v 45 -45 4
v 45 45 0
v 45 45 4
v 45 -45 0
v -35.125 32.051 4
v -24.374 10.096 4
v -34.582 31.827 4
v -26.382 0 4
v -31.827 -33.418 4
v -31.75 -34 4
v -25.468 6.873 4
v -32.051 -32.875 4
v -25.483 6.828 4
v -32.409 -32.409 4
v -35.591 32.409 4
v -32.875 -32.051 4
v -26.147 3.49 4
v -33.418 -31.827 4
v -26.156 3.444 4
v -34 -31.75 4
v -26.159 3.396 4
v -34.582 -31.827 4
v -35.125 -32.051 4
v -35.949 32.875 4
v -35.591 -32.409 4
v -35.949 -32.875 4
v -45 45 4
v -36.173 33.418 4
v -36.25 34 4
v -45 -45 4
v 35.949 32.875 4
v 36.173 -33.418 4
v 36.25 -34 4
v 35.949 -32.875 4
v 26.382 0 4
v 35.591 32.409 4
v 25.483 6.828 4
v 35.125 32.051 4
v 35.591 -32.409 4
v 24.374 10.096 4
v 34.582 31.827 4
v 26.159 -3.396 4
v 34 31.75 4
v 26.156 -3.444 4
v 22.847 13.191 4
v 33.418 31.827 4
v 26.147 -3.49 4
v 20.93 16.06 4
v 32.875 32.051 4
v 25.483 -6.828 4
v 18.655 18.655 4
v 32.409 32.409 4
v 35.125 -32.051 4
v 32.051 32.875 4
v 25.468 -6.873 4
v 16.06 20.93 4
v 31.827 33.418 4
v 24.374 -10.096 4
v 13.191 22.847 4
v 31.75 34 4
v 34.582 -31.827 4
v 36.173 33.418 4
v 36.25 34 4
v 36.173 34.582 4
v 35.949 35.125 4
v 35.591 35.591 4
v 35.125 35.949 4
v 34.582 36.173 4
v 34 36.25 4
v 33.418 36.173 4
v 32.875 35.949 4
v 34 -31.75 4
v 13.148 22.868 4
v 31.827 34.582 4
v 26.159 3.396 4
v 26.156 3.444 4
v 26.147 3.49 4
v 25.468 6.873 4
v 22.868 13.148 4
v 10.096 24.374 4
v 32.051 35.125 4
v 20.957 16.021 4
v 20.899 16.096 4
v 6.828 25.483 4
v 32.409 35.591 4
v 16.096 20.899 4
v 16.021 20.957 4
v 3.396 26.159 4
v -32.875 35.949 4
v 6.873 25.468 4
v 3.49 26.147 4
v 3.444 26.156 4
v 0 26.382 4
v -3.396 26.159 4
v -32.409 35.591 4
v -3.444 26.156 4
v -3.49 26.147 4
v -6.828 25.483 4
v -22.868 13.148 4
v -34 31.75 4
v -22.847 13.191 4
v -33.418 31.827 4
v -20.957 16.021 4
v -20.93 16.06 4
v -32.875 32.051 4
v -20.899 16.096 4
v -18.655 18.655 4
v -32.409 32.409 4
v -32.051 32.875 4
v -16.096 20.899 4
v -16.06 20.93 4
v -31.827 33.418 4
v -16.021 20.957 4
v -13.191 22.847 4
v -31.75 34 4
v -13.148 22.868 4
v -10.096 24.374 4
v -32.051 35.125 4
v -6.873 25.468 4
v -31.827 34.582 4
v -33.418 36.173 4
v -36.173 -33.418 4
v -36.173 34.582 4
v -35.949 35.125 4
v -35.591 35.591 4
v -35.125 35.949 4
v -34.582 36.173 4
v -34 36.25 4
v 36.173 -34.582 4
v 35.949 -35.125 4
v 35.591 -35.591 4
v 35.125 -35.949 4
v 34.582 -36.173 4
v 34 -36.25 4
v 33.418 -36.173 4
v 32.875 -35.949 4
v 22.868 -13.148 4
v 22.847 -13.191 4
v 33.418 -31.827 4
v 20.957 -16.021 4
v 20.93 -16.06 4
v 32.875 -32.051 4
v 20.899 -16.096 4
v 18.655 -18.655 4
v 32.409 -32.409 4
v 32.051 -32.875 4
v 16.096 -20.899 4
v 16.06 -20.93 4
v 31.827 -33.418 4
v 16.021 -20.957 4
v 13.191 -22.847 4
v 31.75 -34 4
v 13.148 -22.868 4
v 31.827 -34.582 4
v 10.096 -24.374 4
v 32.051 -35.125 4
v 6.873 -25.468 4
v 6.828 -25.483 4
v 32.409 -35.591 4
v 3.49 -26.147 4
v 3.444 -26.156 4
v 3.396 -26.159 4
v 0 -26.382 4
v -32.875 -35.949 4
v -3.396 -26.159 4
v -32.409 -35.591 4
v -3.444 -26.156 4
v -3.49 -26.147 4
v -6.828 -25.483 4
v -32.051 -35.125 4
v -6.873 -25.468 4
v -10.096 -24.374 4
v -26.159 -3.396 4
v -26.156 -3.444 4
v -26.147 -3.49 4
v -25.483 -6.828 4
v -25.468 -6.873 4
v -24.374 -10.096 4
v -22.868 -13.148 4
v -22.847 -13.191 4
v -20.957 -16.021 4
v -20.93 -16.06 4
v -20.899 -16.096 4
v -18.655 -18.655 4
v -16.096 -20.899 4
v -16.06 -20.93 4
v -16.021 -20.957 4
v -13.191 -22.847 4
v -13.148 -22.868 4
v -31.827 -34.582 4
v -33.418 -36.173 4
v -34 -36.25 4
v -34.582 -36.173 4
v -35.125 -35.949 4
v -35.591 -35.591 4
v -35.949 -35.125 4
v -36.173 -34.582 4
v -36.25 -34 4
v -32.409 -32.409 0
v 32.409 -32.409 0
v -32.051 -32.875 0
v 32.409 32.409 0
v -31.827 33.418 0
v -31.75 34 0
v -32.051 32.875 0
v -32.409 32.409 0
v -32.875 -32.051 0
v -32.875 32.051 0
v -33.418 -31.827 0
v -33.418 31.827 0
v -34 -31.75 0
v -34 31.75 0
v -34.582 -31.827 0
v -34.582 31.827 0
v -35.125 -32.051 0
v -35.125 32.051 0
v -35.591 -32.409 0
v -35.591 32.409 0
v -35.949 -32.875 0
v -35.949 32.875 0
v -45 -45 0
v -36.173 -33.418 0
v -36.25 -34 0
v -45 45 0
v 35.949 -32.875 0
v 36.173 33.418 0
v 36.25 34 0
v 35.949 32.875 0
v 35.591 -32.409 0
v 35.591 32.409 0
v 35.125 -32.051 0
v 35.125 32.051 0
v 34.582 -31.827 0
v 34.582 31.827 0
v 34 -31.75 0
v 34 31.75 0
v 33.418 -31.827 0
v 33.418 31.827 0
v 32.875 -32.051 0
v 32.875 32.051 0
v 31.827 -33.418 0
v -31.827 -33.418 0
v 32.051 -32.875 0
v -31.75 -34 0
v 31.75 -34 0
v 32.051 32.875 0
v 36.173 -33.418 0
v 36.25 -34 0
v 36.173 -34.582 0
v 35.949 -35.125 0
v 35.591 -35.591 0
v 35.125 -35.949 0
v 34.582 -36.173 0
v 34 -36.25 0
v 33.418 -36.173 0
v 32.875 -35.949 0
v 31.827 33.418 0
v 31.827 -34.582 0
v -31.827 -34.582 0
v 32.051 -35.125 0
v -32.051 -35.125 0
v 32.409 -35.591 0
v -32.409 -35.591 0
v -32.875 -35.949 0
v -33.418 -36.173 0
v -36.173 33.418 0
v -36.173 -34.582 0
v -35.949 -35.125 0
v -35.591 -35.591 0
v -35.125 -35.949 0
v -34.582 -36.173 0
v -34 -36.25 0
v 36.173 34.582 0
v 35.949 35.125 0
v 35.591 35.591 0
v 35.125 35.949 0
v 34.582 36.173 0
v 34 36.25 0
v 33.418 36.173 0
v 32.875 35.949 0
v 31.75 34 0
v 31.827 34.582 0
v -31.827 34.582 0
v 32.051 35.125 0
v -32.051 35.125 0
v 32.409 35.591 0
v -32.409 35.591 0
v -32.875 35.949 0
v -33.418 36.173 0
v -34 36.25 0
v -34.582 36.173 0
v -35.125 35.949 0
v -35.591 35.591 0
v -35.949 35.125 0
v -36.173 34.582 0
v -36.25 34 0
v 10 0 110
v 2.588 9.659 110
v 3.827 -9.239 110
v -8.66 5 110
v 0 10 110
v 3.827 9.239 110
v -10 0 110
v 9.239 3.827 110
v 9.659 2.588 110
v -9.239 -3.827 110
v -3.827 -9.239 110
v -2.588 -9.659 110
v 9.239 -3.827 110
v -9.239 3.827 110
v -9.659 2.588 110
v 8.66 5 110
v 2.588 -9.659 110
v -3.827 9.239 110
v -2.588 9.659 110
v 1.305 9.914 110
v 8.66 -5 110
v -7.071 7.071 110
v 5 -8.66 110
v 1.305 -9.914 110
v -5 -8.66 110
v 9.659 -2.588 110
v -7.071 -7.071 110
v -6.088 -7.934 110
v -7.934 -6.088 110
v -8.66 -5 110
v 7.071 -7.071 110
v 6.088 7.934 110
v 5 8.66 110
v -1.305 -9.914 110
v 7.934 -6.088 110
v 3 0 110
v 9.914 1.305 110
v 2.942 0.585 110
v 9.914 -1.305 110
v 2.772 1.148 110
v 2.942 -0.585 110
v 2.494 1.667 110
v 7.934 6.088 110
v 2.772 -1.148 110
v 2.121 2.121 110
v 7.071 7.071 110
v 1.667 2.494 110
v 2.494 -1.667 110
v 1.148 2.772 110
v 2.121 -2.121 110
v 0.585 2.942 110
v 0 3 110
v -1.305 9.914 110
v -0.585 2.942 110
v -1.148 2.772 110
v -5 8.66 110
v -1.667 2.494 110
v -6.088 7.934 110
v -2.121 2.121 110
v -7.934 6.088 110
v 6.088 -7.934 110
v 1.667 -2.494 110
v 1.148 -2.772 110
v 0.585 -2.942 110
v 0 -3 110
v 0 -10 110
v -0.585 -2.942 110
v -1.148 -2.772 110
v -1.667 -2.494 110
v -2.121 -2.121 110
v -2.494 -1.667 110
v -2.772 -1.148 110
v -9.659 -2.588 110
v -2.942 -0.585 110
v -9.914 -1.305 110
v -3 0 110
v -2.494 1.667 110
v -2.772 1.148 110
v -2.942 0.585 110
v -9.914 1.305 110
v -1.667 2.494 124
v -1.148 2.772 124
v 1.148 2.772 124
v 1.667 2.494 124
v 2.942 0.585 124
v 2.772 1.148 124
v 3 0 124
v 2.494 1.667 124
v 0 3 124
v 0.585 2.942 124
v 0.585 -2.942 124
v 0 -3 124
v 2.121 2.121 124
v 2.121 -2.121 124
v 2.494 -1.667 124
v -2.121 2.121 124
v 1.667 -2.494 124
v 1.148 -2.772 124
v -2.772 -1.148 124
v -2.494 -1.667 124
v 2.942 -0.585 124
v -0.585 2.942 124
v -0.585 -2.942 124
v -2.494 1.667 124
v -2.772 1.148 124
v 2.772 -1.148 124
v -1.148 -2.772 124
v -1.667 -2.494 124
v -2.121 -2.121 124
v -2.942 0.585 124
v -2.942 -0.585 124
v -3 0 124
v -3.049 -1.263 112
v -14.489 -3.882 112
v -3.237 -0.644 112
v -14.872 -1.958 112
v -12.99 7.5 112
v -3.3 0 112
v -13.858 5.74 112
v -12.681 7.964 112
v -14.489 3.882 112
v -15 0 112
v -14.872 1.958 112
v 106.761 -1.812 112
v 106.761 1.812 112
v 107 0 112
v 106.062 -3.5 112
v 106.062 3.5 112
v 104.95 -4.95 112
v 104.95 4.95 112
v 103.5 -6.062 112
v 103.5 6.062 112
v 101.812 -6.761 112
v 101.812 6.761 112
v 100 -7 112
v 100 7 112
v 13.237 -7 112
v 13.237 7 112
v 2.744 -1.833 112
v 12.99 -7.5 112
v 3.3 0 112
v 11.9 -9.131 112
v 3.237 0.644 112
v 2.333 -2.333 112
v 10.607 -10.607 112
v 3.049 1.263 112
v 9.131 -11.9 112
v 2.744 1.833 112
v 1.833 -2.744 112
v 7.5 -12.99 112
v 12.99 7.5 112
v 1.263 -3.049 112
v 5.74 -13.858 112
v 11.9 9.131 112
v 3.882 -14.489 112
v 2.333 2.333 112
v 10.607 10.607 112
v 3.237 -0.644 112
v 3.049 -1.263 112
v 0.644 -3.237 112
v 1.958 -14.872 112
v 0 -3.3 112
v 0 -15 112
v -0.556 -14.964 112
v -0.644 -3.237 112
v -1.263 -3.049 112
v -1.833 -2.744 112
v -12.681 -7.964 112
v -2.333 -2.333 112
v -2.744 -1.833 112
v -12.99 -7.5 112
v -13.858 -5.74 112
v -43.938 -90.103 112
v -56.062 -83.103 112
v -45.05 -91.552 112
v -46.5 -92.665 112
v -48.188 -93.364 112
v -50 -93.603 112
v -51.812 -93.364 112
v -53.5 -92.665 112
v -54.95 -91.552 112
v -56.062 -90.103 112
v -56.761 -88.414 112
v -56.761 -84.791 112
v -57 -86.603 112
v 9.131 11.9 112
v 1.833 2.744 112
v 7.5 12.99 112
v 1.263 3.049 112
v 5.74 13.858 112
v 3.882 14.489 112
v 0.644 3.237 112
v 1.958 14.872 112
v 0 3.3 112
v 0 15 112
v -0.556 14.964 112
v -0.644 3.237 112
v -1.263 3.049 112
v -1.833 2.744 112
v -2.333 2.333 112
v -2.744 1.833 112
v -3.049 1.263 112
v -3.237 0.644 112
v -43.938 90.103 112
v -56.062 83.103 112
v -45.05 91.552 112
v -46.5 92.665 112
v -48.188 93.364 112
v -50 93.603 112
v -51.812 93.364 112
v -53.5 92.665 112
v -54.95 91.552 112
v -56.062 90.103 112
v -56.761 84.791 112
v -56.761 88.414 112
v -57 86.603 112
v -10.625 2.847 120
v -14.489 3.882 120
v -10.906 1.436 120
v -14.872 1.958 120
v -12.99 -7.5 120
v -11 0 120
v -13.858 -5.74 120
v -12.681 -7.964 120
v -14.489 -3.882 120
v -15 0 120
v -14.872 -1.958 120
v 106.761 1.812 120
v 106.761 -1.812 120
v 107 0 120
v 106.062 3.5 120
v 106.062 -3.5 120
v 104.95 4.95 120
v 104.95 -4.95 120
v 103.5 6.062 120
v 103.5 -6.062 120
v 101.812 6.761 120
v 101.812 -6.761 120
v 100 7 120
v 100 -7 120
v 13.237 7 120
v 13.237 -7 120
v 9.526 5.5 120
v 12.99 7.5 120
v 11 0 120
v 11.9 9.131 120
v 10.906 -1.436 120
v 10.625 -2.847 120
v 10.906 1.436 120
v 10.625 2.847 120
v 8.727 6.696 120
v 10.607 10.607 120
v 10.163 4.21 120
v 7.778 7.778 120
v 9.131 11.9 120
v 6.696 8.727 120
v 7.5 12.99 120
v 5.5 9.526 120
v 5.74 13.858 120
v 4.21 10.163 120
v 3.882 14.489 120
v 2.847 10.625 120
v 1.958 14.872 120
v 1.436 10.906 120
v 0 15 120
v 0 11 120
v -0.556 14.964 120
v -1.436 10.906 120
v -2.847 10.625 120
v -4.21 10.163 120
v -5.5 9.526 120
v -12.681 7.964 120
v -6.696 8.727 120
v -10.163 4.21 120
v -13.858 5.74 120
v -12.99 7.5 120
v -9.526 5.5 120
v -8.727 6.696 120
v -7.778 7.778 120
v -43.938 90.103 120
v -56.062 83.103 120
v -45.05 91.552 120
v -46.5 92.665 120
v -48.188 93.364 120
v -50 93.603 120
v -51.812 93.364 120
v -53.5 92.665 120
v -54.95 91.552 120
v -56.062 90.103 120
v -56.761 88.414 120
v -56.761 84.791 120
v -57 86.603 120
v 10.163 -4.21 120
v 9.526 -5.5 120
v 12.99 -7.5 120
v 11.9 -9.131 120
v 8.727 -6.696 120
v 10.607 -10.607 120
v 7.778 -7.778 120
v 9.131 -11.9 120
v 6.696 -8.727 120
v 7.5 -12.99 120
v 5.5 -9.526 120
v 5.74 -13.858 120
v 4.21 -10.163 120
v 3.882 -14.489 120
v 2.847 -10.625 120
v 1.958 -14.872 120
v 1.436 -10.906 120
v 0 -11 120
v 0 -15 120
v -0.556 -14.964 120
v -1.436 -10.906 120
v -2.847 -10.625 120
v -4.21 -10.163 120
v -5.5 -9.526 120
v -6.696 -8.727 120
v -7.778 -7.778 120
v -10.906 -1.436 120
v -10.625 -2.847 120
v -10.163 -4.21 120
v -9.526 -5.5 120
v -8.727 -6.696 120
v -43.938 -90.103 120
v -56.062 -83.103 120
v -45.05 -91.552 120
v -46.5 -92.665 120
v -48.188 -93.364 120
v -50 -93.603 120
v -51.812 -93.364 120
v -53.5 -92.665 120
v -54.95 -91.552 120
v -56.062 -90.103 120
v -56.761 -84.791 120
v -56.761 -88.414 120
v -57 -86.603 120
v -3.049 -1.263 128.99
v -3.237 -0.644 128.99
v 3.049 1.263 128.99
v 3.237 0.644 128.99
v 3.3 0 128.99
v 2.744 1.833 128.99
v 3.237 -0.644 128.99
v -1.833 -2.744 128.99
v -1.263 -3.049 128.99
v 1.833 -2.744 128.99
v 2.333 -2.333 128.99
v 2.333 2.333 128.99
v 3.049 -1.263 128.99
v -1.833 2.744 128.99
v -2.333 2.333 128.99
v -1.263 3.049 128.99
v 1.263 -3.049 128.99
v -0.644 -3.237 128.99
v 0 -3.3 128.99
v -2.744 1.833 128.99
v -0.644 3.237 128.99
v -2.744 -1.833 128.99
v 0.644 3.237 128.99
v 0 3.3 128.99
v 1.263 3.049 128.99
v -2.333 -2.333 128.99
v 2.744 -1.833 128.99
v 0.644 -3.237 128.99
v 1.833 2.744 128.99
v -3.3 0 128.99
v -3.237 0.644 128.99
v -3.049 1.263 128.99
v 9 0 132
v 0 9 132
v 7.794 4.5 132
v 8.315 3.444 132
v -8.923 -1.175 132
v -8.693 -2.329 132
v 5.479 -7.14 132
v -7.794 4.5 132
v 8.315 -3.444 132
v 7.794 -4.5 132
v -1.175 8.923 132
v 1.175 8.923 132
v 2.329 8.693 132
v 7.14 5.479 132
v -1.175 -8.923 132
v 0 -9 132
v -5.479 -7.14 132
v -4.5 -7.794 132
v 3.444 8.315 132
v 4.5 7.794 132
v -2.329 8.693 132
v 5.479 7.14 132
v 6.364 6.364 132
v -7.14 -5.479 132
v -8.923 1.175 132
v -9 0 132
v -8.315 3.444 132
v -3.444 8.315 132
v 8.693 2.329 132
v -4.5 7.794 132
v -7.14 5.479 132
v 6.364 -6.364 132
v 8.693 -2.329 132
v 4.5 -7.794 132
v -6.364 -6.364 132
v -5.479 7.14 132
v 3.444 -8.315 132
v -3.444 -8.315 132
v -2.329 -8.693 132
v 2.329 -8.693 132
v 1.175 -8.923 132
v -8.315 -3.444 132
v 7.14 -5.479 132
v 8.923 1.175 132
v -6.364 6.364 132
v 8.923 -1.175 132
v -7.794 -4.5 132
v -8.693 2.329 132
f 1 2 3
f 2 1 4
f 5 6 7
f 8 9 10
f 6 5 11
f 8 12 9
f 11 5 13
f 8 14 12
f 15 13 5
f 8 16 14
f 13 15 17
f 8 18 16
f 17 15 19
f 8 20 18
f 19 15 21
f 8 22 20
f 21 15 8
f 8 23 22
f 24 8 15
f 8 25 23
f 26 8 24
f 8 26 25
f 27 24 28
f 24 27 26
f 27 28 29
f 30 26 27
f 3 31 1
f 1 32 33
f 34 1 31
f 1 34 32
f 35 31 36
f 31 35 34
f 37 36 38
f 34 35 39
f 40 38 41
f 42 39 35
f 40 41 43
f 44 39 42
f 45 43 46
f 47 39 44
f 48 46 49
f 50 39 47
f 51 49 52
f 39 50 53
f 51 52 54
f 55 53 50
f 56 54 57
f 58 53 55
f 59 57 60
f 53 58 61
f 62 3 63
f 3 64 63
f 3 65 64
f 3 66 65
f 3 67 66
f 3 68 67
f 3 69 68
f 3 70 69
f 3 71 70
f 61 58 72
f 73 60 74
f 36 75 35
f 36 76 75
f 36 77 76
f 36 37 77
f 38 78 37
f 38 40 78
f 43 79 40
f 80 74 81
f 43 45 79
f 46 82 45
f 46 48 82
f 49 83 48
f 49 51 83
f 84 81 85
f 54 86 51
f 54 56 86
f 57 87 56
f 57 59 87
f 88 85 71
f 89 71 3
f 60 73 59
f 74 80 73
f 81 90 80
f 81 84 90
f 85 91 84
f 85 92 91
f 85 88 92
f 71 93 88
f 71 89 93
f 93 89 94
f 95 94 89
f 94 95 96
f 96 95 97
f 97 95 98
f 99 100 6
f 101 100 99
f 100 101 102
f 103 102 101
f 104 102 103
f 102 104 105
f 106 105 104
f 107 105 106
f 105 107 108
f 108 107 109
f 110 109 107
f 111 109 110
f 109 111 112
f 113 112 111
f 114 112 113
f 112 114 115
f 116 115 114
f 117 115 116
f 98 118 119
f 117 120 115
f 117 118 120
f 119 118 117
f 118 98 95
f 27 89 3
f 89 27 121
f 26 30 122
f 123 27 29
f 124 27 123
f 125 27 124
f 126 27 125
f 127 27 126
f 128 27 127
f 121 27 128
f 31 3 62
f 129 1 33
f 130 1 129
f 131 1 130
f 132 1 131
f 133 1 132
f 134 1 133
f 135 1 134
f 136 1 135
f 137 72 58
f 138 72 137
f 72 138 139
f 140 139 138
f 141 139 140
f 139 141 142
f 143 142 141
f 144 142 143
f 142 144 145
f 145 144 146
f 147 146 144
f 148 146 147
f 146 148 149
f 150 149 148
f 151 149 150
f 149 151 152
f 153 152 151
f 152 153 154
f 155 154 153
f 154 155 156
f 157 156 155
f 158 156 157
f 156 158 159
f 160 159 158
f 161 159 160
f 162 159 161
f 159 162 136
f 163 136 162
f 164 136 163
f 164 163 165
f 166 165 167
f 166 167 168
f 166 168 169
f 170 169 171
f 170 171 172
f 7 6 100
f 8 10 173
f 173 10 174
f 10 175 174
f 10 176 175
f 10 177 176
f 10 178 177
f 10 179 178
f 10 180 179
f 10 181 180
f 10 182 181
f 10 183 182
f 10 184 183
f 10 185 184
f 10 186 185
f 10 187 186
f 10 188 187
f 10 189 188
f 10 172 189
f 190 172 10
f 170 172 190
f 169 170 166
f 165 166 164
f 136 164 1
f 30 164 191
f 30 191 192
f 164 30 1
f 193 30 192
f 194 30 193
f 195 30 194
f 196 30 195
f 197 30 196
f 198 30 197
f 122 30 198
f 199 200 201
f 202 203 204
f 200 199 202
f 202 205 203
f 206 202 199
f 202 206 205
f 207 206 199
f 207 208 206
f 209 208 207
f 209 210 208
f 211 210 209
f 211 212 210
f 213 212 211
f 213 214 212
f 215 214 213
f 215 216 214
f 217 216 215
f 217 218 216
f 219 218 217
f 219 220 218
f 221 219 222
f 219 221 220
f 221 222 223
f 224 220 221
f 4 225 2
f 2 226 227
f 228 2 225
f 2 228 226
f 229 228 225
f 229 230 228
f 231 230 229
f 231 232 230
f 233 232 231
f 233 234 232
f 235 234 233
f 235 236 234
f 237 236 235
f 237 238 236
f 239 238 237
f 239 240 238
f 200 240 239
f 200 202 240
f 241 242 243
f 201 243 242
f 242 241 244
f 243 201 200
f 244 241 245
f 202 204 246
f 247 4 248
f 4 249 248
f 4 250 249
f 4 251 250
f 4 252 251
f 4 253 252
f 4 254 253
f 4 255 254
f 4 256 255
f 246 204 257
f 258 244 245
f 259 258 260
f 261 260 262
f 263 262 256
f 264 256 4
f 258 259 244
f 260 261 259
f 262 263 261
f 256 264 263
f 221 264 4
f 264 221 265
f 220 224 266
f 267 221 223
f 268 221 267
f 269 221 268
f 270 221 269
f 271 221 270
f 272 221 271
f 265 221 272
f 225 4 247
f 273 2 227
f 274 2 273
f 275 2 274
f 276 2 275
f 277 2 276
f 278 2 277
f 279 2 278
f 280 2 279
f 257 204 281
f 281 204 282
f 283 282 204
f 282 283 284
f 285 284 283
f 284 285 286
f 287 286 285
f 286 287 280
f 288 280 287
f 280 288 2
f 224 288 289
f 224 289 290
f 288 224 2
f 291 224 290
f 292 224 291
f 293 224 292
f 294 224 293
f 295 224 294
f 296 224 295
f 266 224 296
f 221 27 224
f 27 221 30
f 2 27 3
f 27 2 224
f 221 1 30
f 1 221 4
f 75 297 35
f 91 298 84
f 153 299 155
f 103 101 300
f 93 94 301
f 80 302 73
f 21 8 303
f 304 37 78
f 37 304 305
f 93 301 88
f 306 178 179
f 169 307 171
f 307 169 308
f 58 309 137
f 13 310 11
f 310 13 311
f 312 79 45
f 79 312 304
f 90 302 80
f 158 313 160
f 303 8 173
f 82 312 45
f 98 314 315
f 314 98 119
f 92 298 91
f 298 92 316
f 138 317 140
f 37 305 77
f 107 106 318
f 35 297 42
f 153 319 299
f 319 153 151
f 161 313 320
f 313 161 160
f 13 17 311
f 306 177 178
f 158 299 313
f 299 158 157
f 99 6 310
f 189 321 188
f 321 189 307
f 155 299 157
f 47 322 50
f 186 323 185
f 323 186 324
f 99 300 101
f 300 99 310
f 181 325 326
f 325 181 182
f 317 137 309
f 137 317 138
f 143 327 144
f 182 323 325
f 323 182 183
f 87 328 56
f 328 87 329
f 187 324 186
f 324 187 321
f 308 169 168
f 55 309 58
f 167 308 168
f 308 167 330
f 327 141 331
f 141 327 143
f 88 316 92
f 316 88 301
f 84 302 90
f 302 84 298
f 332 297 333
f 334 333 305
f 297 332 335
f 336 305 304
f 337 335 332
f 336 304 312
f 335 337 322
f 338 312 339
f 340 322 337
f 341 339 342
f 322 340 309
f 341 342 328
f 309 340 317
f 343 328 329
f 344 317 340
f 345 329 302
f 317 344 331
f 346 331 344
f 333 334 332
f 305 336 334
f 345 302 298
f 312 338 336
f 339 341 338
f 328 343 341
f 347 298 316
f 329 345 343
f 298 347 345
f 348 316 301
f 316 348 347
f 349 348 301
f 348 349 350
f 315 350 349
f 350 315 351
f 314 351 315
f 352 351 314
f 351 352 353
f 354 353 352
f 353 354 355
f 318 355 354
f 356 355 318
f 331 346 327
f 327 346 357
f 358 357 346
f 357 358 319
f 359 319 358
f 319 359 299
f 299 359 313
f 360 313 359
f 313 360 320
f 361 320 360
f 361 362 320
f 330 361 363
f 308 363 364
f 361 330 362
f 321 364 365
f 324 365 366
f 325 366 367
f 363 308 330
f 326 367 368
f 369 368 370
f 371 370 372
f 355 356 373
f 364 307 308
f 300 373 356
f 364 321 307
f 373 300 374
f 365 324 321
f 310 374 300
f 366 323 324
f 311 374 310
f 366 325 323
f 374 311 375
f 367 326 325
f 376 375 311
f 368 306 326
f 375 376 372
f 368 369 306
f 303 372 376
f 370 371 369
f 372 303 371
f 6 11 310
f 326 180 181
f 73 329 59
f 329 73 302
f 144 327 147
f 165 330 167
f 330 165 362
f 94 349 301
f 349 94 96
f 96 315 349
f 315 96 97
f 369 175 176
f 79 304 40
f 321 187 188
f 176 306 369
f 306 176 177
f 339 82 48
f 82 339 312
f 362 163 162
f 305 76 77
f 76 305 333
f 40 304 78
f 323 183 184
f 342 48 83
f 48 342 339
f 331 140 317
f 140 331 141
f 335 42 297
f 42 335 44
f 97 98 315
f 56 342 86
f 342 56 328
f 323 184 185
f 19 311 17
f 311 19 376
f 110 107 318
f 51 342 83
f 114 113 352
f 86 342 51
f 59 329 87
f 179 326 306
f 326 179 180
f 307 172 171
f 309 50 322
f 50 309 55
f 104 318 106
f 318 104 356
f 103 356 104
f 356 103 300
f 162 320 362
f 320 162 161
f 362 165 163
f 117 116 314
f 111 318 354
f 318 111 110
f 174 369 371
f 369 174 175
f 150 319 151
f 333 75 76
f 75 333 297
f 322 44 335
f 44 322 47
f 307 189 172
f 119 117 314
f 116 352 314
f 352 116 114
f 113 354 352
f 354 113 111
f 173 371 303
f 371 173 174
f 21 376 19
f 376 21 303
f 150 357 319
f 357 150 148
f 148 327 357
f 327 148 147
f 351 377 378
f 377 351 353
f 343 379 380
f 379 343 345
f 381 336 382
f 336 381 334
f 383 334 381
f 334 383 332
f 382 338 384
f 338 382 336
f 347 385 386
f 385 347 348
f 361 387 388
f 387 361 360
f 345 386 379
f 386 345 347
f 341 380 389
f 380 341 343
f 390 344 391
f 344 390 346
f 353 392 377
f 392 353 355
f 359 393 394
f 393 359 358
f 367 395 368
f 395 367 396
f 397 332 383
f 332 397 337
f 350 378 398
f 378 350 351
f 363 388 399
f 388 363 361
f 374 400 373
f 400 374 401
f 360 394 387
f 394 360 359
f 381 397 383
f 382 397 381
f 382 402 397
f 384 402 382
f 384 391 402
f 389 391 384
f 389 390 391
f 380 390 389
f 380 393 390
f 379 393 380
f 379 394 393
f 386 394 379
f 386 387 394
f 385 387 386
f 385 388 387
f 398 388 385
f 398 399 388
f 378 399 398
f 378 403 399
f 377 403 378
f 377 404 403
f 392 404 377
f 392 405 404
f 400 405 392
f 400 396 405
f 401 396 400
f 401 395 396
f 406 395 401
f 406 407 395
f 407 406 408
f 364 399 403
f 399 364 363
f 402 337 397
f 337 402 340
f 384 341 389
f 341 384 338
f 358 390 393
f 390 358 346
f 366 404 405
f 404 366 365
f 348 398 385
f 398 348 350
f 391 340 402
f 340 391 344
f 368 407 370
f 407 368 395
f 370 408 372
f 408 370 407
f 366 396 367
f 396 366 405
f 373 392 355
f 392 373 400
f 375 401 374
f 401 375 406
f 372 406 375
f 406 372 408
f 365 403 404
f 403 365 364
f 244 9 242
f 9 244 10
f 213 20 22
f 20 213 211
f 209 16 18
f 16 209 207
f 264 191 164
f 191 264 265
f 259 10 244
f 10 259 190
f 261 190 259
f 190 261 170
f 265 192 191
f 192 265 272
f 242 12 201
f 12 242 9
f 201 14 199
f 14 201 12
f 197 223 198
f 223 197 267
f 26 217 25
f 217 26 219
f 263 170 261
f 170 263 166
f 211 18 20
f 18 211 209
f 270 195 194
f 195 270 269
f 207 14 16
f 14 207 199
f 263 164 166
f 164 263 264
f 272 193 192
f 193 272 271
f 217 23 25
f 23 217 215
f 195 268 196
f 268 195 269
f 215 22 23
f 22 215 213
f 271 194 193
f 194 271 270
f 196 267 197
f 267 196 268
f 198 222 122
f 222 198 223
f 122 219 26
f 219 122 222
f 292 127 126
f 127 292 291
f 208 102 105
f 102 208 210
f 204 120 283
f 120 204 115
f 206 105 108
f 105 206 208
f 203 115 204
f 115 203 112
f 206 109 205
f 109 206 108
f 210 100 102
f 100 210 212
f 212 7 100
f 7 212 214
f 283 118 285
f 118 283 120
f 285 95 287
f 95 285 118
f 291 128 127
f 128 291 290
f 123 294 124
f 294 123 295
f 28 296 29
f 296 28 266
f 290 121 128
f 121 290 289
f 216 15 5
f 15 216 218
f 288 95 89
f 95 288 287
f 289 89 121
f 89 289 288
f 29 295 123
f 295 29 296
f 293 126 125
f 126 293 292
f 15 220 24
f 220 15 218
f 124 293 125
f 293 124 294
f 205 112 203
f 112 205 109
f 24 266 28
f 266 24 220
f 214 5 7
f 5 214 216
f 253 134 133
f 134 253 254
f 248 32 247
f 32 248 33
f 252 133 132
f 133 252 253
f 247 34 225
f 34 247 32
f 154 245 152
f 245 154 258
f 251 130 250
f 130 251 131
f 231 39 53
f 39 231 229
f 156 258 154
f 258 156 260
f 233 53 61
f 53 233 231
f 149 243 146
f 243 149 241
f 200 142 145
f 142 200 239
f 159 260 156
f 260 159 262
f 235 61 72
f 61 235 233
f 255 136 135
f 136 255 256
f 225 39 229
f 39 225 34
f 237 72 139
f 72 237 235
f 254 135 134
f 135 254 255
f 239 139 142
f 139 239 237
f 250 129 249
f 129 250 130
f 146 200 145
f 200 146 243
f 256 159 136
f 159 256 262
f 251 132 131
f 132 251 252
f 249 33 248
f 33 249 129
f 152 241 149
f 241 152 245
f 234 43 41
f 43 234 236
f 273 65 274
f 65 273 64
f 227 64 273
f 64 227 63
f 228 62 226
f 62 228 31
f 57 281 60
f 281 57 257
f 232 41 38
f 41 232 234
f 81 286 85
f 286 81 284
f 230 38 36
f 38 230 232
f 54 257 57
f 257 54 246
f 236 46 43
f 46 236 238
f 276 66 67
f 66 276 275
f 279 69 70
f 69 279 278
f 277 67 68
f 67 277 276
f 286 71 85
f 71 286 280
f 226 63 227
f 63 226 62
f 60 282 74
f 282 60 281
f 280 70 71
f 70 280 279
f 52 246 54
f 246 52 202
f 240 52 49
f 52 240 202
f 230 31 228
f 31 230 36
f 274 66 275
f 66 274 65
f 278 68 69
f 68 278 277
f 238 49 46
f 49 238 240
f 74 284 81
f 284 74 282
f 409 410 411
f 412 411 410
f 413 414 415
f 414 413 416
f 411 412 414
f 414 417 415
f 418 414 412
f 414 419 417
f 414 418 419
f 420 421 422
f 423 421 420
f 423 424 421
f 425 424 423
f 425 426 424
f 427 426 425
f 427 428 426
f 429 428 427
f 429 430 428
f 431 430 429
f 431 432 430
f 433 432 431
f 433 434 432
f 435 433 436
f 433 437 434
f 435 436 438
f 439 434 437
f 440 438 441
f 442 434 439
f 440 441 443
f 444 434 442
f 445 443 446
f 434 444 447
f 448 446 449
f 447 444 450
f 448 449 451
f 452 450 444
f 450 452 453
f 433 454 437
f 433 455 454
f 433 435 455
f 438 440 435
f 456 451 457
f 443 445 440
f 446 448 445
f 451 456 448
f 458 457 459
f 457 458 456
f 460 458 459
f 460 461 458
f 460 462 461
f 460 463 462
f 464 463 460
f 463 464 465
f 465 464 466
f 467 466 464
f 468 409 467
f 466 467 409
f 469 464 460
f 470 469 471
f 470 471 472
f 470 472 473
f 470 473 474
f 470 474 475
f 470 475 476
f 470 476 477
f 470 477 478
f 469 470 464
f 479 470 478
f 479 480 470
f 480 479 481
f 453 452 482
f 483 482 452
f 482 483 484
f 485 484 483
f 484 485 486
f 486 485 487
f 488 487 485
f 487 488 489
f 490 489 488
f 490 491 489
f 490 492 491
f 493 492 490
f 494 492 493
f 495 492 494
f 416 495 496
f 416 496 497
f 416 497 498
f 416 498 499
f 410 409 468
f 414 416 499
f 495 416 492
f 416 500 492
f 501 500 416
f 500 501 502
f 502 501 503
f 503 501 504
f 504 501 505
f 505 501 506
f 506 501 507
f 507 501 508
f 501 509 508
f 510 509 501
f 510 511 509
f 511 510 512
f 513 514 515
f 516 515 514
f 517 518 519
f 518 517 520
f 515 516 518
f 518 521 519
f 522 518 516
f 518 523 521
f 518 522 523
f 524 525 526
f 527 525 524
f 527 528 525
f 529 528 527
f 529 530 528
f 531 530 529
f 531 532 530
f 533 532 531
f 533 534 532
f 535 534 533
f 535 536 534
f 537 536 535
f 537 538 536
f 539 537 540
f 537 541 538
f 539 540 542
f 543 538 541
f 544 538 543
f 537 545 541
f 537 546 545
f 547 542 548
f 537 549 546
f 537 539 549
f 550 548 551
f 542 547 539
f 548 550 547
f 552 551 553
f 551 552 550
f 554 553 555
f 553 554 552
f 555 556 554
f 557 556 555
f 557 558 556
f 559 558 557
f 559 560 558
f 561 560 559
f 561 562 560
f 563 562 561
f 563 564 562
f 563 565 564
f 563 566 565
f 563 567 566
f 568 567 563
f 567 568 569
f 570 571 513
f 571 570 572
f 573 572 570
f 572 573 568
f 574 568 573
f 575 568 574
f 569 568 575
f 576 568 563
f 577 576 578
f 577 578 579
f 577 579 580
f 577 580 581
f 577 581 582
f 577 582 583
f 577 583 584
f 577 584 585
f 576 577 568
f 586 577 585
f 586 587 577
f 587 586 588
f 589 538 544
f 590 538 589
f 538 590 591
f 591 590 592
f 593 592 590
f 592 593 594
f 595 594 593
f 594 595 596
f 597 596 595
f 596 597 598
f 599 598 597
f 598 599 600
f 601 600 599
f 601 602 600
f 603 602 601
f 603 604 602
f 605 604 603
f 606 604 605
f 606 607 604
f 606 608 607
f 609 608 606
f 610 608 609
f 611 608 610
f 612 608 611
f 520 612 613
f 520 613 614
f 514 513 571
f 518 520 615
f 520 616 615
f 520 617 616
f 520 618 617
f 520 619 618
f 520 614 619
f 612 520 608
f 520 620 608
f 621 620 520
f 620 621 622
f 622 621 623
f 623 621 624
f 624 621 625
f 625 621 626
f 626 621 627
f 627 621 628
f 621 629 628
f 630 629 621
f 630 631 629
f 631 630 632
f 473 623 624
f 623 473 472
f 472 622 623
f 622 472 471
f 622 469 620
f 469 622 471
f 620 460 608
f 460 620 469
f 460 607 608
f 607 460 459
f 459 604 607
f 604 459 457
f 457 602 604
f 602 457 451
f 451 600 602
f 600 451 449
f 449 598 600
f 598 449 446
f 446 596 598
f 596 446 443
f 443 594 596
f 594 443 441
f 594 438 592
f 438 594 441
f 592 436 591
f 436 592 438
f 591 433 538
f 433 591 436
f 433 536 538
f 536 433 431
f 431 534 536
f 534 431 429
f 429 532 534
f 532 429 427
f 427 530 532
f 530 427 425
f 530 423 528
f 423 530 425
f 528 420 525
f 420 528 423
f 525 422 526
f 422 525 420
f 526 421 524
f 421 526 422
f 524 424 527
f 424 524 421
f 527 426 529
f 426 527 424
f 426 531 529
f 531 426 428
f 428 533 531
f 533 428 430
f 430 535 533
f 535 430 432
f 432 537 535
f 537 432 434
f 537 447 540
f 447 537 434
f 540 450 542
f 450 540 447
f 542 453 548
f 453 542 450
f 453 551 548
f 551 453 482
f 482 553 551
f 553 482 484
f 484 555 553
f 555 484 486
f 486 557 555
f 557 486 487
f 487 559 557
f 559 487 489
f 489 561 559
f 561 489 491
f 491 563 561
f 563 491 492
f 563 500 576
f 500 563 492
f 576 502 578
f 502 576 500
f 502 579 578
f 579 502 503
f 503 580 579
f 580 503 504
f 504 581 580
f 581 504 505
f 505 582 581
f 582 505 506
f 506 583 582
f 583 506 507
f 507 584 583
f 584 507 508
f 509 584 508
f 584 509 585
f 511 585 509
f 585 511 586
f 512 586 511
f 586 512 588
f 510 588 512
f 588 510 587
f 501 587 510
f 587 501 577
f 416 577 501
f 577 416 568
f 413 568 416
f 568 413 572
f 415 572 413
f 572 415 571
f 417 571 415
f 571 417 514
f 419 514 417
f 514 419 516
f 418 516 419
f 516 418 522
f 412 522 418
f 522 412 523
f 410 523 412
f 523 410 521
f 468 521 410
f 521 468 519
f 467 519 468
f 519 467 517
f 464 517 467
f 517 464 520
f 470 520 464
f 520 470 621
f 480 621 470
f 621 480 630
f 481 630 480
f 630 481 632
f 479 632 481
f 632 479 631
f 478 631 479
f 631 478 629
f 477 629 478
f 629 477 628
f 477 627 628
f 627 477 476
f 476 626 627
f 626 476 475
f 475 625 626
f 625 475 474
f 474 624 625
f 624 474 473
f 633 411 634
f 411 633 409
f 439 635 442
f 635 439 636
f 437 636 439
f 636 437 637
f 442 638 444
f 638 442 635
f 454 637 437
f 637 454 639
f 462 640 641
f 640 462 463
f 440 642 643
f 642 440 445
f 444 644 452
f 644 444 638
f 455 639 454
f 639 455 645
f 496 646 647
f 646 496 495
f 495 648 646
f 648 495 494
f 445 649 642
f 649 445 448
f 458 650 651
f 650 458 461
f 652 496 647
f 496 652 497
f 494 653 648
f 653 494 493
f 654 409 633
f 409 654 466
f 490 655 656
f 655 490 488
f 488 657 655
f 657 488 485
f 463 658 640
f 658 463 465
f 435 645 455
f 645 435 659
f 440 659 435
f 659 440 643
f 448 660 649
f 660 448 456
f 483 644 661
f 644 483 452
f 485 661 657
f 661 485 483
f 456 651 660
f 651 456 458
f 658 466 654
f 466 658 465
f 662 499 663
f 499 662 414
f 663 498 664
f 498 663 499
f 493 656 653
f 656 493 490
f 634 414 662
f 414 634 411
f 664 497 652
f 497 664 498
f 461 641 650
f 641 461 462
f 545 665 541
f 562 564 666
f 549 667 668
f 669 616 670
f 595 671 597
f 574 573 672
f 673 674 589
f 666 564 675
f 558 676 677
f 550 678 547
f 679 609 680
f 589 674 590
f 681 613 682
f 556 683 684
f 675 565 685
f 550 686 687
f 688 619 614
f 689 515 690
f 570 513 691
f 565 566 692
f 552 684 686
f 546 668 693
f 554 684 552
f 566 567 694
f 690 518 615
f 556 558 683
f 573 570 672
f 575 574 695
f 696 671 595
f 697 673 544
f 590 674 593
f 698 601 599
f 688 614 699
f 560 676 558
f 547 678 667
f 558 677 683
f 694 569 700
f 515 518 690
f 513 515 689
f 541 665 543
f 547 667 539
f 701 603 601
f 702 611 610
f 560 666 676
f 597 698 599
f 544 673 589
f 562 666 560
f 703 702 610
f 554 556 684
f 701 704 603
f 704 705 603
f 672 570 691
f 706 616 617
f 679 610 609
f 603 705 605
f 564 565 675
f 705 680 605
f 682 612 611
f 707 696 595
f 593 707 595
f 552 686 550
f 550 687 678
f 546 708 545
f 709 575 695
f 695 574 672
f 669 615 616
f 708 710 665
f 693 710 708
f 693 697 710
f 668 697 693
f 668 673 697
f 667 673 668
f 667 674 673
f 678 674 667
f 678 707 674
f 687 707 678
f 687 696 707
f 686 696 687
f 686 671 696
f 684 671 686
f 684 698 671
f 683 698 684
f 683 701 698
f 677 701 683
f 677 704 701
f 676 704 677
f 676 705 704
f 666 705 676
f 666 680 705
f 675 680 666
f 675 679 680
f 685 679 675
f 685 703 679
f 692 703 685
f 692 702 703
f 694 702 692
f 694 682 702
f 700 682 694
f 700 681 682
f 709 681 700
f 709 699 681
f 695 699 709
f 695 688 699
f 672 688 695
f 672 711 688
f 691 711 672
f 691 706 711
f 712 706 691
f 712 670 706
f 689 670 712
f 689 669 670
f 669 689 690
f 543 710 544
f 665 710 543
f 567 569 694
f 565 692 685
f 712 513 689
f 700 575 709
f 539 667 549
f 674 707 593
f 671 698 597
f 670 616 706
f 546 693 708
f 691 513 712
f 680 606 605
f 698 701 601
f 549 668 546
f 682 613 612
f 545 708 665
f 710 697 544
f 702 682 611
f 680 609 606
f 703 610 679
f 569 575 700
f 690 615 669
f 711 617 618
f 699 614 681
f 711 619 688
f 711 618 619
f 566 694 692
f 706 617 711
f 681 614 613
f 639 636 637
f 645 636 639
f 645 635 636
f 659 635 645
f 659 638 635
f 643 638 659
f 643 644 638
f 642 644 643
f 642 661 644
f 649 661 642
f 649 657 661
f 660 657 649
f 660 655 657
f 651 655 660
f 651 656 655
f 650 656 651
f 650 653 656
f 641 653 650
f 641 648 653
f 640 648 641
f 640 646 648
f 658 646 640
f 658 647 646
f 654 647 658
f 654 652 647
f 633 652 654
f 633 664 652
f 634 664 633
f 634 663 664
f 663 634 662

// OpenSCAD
// file: ../models/drone-playground-carousel-cap/model.scad
cap_diameter=22; cap_height=12; socket_diameter=6.6; socket_depth=9;
module carousel_cap(){ difference(){ cylinder(d1=cap_diameter,d2=18,h=cap_height,$fn=48); translate([0,0,-0.01]) cylinder(d=socket_diameter,h=socket_depth,$fn=32); }}
assert(socket_diameter==6.6 && socket_depth<cap_height); echo("SCADCTL_REQUIREMENT:parameters:PASS"); carousel_cap();
// file: ../models/drone-playground-carousel-rotor/model.scad
arm_radius=100; arm_width=14; rotor_thickness=8; hub_diameter=30; axle_bore=6.6;
module carousel_rotor(){ difference(){ linear_extrude(height=rotor_thickness) union(){ circle(d=hub_diameter,$fn=48); for(a=[0,120,240]) rotate(a) hull(){ circle(d=arm_width,$fn=24); translate([arm_radius,0]) circle(d=arm_width,$fn=24); } } translate([0,0,-1]) cylinder(d=axle_bore,h=rotor_thickness+2,$fn=32); }}
assert(arm_radius==100 && axle_bore==6.6); echo("SCADCTL_REQUIREMENT:parameters:PASS"); carousel_rotor();
// file: ../models/drone-playground-carousel-base/model.scad
base_size=90; post_height=110; post_diameter=20; spindle_diameter=6; mount_hole_diameter=4.5;
module carousel_base(){ difference(){ union(){ translate([-base_size/2,-base_size/2,0]) cube([base_size,base_size,4]); cylinder(d1=54,d2=post_diameter,h=post_height,$fn=48); translate([0,0,post_height]) cylinder(d=spindle_diameter,h=14,$fn=32); } for(x=[-34,34],y=[-34,34]) translate([x,y,-1]) cylinder(d=mount_hole_diameter,h=7,$fn=24); }}
assert(post_height==110 && spindle_diameter==6); echo("SCADCTL_REQUIREMENT:parameters:PASS"); carousel_base();
// main file
use <../models/drone-playground-carousel-base/model.scad>
use <../models/drone-playground-carousel-rotor/model.scad>
use <../models/drone-playground-carousel-cap/model.scad>
color("slategray") carousel_base();
color("hotpink") translate([0,0,112]) carousel_rotor();
color("gold") translate([0,0,120]) carousel_cap();
